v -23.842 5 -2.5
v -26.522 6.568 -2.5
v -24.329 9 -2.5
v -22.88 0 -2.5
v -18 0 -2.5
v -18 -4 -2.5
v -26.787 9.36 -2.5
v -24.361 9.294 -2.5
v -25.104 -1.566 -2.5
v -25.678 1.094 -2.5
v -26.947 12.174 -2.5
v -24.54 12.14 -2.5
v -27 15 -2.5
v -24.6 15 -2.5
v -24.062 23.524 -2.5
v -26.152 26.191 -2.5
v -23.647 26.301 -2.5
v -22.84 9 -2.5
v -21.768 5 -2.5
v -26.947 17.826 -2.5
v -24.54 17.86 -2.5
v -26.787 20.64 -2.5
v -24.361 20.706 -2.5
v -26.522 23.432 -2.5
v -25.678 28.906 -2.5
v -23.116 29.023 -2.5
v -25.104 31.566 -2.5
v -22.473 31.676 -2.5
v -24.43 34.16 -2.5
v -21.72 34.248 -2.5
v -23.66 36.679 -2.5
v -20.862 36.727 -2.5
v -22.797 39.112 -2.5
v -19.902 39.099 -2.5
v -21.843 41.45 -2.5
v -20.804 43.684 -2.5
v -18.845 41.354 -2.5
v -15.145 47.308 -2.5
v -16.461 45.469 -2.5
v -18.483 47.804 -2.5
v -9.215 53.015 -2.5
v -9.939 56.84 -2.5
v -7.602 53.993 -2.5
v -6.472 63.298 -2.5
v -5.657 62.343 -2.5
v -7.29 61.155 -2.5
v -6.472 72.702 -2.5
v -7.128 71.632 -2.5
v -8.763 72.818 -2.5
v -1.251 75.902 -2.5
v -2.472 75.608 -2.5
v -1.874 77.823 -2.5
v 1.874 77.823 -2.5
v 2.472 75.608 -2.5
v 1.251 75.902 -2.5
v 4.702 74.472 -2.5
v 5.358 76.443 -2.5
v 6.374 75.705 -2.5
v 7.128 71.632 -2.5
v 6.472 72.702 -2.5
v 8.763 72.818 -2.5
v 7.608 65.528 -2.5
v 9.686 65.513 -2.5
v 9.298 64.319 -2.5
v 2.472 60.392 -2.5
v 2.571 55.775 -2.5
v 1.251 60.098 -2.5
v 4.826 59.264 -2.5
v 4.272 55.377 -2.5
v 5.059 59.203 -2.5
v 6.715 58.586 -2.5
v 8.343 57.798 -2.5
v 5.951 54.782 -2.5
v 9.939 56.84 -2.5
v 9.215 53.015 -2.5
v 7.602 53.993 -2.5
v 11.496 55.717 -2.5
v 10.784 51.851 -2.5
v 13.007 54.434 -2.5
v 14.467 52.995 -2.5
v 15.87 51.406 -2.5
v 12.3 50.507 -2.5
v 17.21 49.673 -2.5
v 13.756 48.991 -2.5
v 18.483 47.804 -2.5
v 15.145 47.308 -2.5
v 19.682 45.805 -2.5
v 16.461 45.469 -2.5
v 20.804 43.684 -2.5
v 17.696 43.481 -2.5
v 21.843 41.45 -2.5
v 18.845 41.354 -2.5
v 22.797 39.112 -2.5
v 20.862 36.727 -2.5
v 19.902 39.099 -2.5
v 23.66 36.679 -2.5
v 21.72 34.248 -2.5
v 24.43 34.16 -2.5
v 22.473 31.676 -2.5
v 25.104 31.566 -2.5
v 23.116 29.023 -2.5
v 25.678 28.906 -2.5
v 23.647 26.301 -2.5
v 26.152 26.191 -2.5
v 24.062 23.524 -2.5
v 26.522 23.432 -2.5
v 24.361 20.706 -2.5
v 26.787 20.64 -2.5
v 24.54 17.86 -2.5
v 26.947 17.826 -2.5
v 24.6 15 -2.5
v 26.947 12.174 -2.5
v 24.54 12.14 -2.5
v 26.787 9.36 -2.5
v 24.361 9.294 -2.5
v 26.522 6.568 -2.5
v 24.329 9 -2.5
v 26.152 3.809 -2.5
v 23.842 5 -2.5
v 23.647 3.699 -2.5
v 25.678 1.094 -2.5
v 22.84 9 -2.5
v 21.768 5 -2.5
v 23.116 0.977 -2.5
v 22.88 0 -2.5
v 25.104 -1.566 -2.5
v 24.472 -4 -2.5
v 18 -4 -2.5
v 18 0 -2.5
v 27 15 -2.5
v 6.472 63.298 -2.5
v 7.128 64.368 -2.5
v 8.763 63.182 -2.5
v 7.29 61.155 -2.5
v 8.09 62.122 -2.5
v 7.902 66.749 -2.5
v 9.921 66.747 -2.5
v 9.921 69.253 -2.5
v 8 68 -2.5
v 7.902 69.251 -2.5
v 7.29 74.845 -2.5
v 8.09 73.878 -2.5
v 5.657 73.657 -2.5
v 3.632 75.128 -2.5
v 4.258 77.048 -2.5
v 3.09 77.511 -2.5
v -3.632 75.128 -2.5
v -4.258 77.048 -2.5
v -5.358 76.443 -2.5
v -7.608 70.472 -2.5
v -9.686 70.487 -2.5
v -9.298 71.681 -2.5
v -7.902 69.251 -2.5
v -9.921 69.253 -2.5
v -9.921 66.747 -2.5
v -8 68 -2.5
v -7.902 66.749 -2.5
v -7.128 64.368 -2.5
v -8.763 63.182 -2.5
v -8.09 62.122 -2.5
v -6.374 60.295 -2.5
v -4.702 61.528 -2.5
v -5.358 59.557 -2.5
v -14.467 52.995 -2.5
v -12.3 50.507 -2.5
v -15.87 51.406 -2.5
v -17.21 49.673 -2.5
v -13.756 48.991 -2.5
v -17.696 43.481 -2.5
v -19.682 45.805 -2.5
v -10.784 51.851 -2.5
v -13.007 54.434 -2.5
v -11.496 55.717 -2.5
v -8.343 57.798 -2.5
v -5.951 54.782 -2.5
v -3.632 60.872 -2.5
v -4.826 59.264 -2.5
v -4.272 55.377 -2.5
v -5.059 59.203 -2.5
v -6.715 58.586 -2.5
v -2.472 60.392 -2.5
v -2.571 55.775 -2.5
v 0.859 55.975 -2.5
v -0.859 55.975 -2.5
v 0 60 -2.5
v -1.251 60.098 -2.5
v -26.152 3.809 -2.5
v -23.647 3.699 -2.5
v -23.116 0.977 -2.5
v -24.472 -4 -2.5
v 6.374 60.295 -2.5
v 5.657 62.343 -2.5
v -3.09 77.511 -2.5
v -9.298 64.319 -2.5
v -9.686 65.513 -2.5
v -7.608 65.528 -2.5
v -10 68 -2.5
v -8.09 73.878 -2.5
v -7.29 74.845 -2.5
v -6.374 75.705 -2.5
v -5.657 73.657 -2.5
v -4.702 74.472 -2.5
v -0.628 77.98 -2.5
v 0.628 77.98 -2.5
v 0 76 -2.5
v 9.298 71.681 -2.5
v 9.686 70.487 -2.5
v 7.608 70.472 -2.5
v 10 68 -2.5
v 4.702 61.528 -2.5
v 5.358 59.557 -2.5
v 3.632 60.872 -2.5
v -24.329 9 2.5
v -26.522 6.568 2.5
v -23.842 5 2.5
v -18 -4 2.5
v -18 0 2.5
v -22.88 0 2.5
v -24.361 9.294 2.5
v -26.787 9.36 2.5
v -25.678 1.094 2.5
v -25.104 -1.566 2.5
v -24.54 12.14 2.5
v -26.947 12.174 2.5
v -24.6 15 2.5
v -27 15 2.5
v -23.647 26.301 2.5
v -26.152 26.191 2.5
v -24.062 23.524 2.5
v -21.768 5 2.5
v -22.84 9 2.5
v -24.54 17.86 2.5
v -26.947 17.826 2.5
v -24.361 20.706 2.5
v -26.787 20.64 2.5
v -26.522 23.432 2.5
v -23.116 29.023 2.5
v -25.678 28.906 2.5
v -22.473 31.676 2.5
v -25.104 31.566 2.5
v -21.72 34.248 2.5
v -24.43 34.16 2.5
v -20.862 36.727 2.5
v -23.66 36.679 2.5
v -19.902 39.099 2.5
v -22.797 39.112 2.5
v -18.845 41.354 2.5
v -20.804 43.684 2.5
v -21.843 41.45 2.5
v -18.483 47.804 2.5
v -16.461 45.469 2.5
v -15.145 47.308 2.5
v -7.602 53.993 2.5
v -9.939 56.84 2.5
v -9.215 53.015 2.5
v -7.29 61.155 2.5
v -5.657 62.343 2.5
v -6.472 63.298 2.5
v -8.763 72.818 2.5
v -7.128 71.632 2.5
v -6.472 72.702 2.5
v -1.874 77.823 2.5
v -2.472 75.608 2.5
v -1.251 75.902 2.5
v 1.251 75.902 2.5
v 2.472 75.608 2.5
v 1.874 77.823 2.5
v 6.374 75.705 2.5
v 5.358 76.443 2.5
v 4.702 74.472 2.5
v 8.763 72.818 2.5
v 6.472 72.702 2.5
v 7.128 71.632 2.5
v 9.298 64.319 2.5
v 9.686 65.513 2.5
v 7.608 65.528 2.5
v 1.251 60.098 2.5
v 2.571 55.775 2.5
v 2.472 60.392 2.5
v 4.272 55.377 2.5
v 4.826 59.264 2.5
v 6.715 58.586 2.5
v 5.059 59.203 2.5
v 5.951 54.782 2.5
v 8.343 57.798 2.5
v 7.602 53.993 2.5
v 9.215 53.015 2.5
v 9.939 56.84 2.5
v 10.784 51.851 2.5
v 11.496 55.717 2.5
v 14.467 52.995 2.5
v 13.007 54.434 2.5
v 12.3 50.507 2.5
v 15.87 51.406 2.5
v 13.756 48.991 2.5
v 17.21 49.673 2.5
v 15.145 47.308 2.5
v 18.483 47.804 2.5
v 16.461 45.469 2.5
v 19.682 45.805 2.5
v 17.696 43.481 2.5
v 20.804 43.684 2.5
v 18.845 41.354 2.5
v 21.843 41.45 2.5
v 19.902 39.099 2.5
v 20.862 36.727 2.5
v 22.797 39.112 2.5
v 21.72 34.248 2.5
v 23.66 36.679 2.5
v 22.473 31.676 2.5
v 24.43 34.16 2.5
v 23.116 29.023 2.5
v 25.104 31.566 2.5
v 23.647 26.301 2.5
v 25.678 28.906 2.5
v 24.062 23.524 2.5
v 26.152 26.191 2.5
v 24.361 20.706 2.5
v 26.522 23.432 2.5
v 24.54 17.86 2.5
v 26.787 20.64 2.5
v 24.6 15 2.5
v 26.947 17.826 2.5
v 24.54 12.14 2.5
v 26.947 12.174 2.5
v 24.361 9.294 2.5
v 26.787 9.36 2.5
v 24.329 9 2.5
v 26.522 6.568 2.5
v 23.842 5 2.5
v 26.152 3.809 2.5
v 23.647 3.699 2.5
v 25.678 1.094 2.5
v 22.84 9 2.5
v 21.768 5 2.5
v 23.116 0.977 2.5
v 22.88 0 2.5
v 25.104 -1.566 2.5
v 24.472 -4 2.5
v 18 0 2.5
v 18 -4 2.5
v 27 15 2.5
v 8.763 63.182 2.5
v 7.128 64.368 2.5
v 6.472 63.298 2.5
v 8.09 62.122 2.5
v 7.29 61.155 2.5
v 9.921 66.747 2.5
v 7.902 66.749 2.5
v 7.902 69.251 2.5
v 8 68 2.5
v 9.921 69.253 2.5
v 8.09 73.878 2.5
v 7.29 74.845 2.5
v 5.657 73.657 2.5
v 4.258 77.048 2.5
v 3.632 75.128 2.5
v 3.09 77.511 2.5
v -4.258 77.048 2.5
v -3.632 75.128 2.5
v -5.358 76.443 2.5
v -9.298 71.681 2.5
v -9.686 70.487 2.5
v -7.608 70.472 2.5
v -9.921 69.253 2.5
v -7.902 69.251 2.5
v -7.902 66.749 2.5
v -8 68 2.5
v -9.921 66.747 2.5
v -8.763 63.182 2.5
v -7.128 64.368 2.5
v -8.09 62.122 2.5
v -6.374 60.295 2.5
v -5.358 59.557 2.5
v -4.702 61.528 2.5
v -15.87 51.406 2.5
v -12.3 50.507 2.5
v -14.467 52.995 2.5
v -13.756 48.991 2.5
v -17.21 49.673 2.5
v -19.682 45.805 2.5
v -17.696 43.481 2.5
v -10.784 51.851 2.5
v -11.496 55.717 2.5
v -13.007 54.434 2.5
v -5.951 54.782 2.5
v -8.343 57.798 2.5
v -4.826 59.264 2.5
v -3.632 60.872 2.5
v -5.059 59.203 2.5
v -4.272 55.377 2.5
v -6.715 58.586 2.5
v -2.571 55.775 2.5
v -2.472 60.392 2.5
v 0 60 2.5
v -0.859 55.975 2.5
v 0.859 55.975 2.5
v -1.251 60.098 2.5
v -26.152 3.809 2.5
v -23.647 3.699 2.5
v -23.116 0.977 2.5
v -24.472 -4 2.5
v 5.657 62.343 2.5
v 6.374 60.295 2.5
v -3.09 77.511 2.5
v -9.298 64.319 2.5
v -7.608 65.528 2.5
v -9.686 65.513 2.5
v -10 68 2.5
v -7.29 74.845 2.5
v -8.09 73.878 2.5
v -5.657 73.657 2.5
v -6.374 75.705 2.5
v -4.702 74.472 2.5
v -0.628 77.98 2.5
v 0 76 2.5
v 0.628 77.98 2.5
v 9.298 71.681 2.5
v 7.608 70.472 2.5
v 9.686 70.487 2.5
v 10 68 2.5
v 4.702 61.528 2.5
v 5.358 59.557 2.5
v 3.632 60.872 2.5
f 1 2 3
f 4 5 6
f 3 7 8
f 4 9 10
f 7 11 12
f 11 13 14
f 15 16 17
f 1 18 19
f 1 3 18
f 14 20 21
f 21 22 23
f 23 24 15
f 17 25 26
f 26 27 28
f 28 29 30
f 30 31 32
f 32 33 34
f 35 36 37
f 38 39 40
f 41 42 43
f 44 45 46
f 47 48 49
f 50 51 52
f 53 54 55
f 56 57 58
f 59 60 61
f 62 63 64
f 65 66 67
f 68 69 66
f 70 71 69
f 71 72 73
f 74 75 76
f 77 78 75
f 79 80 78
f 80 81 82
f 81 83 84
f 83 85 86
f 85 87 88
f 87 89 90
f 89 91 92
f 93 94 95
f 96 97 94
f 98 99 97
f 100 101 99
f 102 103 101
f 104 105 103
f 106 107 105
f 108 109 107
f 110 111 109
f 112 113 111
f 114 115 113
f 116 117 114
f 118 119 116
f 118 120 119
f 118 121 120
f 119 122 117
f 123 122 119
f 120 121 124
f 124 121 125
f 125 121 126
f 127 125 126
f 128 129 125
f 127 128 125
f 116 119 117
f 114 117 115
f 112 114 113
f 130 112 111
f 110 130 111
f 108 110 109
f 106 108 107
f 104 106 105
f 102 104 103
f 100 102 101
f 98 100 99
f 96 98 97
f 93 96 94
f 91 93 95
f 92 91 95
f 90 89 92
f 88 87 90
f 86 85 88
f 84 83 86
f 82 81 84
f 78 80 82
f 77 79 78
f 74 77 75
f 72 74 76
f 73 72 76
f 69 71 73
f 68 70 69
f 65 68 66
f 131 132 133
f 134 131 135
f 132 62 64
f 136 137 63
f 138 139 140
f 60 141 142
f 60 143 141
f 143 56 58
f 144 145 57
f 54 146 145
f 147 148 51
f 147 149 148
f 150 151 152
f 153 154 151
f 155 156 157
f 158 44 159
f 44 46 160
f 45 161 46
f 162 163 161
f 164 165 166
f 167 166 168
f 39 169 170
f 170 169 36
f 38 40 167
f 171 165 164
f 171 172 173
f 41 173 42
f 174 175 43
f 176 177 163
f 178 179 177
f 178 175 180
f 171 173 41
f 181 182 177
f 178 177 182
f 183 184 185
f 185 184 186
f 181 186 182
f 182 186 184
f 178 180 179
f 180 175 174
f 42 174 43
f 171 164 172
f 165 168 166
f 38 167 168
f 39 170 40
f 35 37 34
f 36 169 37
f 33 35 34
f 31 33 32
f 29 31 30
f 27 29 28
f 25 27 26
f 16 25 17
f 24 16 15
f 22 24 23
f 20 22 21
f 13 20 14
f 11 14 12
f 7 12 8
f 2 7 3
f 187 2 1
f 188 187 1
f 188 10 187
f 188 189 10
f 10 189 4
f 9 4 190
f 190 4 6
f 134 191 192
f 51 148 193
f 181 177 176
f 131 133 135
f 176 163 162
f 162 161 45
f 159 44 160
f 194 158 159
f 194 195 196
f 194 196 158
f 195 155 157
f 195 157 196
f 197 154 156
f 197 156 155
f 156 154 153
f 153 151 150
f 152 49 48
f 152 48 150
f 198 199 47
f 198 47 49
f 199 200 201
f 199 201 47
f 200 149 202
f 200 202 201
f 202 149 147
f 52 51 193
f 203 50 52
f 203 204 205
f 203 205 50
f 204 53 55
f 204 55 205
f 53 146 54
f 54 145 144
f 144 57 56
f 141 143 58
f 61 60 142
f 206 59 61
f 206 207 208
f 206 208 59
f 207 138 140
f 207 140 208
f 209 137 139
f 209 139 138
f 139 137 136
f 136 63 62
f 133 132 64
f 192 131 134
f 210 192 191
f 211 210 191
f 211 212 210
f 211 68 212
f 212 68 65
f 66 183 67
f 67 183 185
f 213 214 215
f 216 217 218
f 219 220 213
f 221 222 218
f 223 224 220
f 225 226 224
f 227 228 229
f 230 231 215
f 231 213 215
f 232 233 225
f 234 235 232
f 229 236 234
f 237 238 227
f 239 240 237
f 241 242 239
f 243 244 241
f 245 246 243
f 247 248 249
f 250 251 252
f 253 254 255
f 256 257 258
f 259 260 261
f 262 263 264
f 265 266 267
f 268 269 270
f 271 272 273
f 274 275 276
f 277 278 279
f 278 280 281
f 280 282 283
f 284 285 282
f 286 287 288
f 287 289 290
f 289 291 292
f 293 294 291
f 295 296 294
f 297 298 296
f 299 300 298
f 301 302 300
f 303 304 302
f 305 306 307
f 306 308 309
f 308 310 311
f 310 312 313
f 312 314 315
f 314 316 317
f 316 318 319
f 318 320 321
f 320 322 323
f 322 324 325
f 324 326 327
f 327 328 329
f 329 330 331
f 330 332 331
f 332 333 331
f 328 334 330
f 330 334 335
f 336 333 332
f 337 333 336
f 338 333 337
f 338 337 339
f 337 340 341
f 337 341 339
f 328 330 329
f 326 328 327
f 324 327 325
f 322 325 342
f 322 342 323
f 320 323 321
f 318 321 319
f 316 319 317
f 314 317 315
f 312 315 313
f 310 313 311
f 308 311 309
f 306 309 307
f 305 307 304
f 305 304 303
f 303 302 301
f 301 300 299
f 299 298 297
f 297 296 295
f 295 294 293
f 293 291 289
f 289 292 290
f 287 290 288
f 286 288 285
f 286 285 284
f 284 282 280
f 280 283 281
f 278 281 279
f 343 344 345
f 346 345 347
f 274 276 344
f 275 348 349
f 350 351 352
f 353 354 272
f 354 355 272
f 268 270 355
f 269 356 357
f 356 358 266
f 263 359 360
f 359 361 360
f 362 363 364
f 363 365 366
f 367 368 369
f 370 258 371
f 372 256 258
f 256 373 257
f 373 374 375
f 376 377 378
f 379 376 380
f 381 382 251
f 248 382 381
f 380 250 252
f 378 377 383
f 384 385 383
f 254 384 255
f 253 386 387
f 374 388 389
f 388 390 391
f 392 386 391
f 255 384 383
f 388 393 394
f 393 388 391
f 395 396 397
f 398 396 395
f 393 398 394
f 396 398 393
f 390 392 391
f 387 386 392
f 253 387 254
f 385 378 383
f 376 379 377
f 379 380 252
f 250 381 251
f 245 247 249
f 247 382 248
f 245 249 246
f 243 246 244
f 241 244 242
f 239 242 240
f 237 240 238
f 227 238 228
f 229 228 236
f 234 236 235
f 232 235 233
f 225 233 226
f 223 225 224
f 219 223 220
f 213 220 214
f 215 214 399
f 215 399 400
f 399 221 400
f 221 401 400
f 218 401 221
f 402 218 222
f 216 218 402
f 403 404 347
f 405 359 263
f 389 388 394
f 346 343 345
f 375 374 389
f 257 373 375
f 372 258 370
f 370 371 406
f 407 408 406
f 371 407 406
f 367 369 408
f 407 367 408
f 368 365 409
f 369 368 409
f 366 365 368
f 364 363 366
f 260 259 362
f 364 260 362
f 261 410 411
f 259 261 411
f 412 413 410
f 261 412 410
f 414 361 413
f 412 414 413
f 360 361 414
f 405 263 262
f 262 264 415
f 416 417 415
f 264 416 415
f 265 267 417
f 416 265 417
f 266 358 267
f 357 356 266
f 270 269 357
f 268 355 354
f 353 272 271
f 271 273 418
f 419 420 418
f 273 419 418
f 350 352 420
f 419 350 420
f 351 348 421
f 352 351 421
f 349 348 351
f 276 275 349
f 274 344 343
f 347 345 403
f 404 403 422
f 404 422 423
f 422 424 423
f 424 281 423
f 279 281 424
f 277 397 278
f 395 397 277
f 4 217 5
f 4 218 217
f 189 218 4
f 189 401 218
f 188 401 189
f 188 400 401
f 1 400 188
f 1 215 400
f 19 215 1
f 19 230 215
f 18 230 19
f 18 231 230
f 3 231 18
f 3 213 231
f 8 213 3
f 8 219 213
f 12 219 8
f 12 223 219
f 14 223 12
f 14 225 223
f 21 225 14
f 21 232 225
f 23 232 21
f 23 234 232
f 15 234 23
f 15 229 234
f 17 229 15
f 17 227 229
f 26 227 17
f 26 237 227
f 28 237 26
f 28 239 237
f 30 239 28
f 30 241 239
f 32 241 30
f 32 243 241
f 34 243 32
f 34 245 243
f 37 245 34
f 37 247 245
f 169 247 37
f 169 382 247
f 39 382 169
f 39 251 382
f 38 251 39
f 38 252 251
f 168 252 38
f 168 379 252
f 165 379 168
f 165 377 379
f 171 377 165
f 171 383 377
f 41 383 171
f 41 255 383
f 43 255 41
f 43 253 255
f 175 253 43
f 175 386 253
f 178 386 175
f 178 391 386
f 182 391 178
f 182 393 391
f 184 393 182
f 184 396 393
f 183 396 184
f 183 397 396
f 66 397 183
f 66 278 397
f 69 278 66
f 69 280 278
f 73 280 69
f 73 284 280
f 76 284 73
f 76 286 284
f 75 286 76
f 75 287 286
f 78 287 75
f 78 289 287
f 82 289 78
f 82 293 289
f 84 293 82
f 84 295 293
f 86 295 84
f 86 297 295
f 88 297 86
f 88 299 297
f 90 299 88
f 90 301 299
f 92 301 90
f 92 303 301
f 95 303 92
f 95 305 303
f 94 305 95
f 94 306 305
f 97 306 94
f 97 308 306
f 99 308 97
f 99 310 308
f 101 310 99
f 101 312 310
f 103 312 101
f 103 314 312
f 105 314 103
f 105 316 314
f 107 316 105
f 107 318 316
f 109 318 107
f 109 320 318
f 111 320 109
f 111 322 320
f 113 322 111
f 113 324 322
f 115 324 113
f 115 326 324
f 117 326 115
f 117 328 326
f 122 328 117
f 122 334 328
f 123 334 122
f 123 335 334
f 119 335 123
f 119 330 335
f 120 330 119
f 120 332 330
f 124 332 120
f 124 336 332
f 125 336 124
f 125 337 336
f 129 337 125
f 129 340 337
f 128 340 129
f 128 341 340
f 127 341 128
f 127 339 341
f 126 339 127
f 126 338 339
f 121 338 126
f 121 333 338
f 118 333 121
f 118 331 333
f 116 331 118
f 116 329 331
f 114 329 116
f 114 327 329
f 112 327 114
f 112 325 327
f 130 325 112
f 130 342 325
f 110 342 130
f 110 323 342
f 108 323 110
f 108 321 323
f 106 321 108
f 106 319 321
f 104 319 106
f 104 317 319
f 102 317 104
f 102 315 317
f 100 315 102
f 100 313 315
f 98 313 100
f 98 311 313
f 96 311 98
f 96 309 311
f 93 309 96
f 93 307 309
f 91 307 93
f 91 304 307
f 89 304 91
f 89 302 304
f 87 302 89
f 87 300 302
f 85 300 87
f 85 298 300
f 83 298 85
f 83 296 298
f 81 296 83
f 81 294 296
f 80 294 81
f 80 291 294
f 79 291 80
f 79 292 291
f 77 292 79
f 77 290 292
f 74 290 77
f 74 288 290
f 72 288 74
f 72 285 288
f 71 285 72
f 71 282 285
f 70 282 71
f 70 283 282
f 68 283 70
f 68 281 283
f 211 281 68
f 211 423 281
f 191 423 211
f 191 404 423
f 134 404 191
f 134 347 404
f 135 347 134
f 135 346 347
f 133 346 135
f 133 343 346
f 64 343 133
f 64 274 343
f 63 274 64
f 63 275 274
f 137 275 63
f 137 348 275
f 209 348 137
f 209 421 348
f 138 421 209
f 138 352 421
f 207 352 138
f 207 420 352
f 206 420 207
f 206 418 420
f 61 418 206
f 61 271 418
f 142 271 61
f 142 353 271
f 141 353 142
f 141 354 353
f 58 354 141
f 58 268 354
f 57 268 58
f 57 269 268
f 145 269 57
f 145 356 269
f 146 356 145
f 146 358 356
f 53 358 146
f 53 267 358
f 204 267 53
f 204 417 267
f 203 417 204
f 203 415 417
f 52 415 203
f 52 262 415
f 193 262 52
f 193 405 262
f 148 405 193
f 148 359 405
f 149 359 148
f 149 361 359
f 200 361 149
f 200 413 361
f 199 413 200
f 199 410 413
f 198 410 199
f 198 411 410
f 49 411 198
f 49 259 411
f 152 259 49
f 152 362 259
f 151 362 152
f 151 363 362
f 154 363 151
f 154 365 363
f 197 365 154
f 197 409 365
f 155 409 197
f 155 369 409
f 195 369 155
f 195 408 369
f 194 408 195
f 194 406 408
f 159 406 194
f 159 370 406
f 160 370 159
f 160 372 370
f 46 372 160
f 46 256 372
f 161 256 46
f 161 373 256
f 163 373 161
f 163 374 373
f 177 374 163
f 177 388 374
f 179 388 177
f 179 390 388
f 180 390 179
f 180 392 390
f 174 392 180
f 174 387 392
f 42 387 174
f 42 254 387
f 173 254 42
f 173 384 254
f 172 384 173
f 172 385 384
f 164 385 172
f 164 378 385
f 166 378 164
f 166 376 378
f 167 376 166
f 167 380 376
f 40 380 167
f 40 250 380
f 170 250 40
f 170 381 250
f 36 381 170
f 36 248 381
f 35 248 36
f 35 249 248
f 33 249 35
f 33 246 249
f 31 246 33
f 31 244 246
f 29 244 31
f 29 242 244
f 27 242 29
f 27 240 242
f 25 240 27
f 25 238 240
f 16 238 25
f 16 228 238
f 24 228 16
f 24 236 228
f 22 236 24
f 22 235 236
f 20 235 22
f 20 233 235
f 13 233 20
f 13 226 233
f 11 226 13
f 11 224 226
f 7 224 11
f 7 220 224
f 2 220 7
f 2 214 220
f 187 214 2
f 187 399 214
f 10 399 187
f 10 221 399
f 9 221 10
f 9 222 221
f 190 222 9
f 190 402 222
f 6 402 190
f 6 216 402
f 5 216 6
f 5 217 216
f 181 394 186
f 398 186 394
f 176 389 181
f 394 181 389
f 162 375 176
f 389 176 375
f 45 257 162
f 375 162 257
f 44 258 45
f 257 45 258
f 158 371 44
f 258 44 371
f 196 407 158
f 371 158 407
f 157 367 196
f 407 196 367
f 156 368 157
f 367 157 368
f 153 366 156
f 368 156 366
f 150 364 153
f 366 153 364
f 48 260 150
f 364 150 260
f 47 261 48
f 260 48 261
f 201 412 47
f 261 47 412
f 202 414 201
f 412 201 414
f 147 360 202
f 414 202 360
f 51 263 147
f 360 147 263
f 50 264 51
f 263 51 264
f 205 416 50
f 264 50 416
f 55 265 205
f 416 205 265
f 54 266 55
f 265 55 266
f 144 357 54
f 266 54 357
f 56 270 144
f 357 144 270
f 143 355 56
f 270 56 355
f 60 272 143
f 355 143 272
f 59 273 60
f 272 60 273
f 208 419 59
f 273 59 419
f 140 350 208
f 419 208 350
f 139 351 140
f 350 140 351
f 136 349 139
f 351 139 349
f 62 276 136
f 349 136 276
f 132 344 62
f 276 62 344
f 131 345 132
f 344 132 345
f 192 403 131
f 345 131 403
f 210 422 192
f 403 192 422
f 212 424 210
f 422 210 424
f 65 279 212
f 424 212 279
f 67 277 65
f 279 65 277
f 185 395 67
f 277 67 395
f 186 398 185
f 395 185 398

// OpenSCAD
part="handle"; // [handle,base,all]
size=47;
//rotate([-90,0])
if(part=="handle")
  rotate([-90,0]) handle();
else if(part=="base")
  base();
else if(part=="all")
{
  handle();
  base();
}
module handle() {
  translate([0,2.5]) rotate([90,0]) linear_extrude(5) {
    intersection()
    {
      translate([-30,-4]) square([60,100]);
      union(){
   translate([0,15]) scale([1.2,2]) difference() {
     circle(d=45,$fn=100);
     circle(d=41,$fn=90);
   }
   for(m=[0,1]) mirror([m,0]) {
   translate([-24,-4]) square([6,4]);
   translate([-26,5]) difference(){
     square([4.5,4]);
     translate([4.5,-1]) rotate([0,0,15]) square([5,6]);
   }
   }
   //polygon([[-18,48.5],[-22.5,8], [-20,8],[-20,5.6],[-23,5.6],[-23,-.4], [-20,-.4],[-20,-4],[-25,-4],[-25,5.6], [-20,50],[0,60],[20,50],[25,6],[25,-4], [20,-4],[20,-.4],[23,-.4],[23,5.6], [20,5.6],[20,8],[22.5,8],[18,48.5],[0,57]]);
    translate([0,68]) difference() {
      circle(d=20,$fn=50);
      circle(d=16,$fn=40);
    }
  }
}
  }
}
module base() {
  difference(){
    cylinder(d1=45,d2=47,h=5,$fn=100);
    translate([0,0,-.01]) cylinder(d1=36,d2=41,h=5.02,$fn=90);
  }
  for(m=[0,1]) mirror([m,0])
  translate([-26,-5])
  difference(){
    cube([5,10,5]);
    translate([-.01,2,-.01]) cube([8,6,5.2]);
  }
    
}
